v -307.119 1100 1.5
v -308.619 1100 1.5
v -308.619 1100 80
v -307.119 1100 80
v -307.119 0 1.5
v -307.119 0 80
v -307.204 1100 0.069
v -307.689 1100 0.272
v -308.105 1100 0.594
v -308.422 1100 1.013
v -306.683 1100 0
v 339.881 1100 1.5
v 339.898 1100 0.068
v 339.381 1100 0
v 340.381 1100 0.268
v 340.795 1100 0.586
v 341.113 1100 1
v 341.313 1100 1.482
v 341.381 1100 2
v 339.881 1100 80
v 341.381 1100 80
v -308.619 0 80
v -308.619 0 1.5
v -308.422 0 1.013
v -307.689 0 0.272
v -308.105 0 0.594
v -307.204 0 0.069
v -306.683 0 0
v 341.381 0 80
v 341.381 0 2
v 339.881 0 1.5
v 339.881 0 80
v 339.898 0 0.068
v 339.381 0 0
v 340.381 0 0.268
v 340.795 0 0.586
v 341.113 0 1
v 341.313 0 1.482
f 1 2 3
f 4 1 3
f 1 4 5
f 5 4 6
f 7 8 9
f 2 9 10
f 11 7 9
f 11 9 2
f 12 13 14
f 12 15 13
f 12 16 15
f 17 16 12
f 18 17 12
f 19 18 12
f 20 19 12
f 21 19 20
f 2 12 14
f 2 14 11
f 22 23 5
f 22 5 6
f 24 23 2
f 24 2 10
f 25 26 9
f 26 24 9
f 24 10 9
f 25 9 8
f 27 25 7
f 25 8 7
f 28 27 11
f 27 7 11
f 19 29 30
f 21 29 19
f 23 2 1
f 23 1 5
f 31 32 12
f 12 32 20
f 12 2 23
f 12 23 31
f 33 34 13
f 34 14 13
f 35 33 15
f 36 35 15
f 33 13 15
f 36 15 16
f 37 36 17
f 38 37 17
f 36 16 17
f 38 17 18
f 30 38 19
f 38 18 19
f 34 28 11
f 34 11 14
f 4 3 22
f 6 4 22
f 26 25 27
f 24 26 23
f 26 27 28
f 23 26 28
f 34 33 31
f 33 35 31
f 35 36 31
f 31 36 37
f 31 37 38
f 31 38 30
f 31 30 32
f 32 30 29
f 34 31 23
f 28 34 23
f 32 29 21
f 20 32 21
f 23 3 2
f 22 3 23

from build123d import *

# Parameters (mm, degrees)
F0_W        = 650
F0_H        = 1100
F1_DEPTH    = 1.5
F2_W        = 1100
F2_H        = 78.5
F3_DEPTH    = 1.5
F4_T1_DEPTH = 1109.6824583655
F5_W        = 1100
F5_H        = 78.5
F6_DEPTH    = 1.5
F7_R        = 2


# Not quite as in the source:
# - a fillet or chamfer that OpenCascade refuses, or shapes differently, is made with other operations: its cross-section is extruded or revolved along the edge and cut away or added


with BuildPart() as f1:
    # F0 (on Top) → F1 (new body)
    with BuildSketch(Plane.XY):
        with Locations((16.3806613057, 550)):
            Rectangle(F0_W, F0_H)
    extrude(amount=F1_DEPTH)

    # F4: fillet of radius 2 on 1 edges, made by hand

    # F4_s2 → F4_t1 (cut)
    with BuildSketch(Plane.XZ.offset(-1104.8412291828)):
        with BuildLine():
            ThreePointArc((-308.6193386943, 1.5), (-307.9075918926, 0.4188611699), (-306.6828470212, 0))
            Line((-306.6828470212, 0), (-308.6193386943, 0))
            Line((-308.6193386943, 0), (-308.6193386943, 1.5))
        make_face()
    extrude(amount=F4_T1_DEPTH, mode=Mode.SUBTRACT)

    # F5 (on face) → F6 (join)
    with BuildSketch(Plane.YZ.offset(341.3806613057)):
        with Locations((550, 40.75)):
            Rectangle(F5_W, F5_H)
    extrude(amount=-F6_DEPTH)

    # F7
    f7_edges = [f1.edges().sort_by_distance(p)[0] for p in [
        (341.380661, 550, 0),
    ]]
    fillet(f7_edges, radius=F7_R)


with BuildPart() as f3:
    # F2 (on face) → F3 (new body)
    with BuildSketch(Plane(origin=(-308.6193386943, 0, 0), x_dir=(0, -1, 0), z_dir=(-1, 0, 0))):
        with Locations((-550, 40.75)):
            Rectangle(F2_W, F2_H)
    extrude(amount=-F3_DEPTH)


solid = Compound([f1.part, f3.part])
